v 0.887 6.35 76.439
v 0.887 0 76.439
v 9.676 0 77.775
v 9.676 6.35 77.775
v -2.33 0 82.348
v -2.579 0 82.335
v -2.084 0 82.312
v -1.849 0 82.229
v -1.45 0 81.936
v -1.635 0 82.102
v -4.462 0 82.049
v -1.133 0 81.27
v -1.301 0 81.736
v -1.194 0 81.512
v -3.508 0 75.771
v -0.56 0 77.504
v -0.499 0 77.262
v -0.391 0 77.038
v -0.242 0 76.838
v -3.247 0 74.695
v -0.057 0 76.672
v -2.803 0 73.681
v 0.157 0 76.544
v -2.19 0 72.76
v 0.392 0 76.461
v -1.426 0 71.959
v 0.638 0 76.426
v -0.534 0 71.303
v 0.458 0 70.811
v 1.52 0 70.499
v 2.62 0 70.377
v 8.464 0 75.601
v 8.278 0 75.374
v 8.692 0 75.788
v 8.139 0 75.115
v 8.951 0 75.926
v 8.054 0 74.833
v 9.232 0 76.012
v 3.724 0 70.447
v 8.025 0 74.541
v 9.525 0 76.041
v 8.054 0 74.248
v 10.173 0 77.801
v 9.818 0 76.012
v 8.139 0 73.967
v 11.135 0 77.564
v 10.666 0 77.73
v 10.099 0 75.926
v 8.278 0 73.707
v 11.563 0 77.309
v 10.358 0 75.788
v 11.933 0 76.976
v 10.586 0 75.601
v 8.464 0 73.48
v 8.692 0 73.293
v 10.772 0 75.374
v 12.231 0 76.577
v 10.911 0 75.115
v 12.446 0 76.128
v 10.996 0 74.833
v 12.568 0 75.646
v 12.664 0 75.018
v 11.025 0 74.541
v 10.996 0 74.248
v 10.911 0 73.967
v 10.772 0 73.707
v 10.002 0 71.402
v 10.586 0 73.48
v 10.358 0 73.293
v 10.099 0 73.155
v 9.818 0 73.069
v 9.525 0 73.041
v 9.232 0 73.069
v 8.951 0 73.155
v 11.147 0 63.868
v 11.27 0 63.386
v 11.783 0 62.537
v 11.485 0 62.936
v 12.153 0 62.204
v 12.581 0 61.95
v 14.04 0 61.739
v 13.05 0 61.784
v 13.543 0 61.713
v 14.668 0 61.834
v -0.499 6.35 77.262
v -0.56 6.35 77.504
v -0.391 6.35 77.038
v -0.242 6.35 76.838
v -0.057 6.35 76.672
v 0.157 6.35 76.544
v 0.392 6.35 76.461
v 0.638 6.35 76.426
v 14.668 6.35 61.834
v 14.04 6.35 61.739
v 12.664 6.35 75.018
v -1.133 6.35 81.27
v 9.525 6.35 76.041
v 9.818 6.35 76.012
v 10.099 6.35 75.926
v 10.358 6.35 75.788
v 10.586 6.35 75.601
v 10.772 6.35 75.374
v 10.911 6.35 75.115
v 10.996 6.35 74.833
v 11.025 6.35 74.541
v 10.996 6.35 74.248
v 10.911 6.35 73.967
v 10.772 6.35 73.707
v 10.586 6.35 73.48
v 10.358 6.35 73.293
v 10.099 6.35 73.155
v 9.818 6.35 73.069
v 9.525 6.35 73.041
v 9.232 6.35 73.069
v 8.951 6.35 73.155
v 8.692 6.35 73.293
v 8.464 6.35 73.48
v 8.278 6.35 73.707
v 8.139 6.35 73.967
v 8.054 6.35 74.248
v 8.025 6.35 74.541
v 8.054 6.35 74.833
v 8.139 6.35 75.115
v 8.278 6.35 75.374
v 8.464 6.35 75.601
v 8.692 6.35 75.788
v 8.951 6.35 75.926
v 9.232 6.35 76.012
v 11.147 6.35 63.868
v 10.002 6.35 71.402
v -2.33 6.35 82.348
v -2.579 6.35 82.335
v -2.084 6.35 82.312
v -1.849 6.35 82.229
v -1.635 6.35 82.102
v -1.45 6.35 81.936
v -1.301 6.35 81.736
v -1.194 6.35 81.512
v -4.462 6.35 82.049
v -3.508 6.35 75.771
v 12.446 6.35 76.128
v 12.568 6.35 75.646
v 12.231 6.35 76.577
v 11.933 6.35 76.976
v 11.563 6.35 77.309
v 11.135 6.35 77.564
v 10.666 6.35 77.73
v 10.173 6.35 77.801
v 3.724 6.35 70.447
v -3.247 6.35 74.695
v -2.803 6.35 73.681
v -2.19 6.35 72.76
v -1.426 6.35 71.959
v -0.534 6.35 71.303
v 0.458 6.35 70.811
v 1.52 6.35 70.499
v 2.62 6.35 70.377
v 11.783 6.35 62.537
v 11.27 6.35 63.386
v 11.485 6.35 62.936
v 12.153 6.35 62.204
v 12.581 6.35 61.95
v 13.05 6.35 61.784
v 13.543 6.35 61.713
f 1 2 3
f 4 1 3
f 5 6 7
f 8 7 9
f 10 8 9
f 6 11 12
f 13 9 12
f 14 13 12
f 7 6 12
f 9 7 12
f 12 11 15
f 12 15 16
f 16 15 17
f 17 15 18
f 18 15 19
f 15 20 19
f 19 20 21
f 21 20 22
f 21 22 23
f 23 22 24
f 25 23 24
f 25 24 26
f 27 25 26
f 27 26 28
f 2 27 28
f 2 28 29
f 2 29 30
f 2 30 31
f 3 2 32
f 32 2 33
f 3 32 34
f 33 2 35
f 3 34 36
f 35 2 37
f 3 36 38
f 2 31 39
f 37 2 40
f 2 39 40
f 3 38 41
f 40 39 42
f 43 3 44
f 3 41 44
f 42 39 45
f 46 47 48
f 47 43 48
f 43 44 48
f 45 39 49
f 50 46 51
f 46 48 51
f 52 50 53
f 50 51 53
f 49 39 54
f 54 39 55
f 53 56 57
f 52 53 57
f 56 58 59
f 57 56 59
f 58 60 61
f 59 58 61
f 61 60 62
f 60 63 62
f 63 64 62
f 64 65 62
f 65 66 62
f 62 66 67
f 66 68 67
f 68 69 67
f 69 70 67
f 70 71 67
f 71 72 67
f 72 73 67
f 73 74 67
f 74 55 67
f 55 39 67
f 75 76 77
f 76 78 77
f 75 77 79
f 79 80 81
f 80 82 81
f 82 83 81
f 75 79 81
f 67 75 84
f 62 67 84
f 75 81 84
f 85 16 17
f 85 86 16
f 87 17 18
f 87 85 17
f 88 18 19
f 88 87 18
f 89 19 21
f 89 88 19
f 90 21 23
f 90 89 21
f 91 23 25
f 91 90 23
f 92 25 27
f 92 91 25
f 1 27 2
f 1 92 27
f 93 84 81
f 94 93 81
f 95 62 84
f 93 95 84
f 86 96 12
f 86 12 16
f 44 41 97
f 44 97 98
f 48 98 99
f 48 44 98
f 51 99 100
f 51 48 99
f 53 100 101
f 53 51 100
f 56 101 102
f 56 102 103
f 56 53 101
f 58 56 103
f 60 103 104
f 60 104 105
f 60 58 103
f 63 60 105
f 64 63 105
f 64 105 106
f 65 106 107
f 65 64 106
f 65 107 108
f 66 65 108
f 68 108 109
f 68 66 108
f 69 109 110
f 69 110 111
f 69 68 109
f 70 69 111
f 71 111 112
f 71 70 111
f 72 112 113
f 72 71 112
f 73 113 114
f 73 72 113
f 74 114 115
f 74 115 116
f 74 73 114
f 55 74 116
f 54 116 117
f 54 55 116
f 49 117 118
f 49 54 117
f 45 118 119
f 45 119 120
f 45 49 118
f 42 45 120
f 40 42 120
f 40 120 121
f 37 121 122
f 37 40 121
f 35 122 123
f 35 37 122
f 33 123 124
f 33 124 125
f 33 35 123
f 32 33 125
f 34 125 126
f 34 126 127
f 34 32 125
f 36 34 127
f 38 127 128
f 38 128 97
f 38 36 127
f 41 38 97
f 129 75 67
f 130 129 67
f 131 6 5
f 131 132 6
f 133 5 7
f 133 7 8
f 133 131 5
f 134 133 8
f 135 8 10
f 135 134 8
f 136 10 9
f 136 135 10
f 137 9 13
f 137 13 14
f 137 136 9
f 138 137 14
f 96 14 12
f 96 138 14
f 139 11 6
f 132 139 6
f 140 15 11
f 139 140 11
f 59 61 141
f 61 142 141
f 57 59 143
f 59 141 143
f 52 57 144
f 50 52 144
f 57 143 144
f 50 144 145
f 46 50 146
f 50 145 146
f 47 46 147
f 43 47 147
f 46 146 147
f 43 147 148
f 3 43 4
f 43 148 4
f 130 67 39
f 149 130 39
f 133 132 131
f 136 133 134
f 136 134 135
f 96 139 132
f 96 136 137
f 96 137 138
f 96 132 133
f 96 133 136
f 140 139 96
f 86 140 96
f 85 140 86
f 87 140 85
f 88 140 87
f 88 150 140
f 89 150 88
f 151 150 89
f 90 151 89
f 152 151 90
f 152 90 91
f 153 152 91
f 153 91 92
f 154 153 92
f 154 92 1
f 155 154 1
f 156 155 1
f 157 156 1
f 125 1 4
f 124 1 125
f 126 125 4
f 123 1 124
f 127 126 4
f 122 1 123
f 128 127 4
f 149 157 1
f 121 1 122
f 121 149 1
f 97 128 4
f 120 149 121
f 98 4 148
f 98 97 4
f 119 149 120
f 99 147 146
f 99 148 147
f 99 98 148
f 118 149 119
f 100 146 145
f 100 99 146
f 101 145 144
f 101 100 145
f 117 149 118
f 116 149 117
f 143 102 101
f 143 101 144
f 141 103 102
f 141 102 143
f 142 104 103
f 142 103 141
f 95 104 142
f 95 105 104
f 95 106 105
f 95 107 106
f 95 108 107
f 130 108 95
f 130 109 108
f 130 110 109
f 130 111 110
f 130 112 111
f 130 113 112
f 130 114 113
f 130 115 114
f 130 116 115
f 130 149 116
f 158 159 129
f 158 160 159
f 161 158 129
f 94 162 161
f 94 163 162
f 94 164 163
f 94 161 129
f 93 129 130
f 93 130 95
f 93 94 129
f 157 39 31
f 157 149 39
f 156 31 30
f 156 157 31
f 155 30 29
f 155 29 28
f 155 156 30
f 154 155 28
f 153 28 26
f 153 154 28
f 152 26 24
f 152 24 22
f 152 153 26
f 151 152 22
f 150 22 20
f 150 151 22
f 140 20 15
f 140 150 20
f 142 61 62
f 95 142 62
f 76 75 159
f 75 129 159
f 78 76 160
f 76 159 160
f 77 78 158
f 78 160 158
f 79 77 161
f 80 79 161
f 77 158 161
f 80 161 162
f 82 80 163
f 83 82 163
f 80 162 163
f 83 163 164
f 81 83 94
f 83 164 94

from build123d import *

# Parameters (mm, degrees)
SKETCH2_R           = 1.5
BOSS_EXTRUDE1_DEPTH = 6.35
FILLET1_R           = 1.27
FILLET2_R           = 2.54
FILLET3_R           = 6.35
FILLET4_R           = 2.54


with BuildPart() as part:
    # Sketch2 → Boss-Extrude1 (new body)
    with BuildSketch(Plane(origin=(0, 0, 0), x_dir=(1, 0, 0), z_dir=(0, 1, 0))):
        Polygon((-2.553535433, -69.492861925), (-4.46233448, -82.048597116), (-1.323400683, -82.525796878), (-0.369001159, -76.247929282), (12.186734033, -78.15672833), (12.663933794, -75.017794532), (14.668172794, -61.834272581), (11.529238997, -61.357072819), (10.002199758, -71.401660972), align=None)
        with Locations(Location((9.524999997, -74.54059477, 0), (0, 0, 270))):
            Circle(SKETCH2_R, mode=Mode.SUBTRACT)
    extrude(amount=BOSS_EXTRUDE1_DEPTH)

    # Fillet1
    fillet1_edges = [part.edges().sort_by_distance(p)[0] for p in [
        (-0.369001159, 3.175, 76.247929282),
        (-1.323400683, 3.175, 82.525796878),
    ]]
    fillet(fillet1_edges, radius=FILLET1_R)

    # Fillet2
    fillet2_edges = [part.edges().sort_by_distance(p)[0] for p in [
        (11.529238997, 3.175, 61.357072819),
    ]]
    fillet(fillet2_edges, radius=FILLET2_R)

    # Fillet3
    fillet3_edges = [part.edges().sort_by_distance(p)[0] for p in [
        (-2.553535433, 3.175, 69.492861925),
    ]]
    fillet(fillet3_edges, radius=FILLET3_R)

    # Fillet4
    fillet4_edges = [part.edges().sort_by_distance(p)[0] for p in [
        (12.186734033, 3.175, 78.15672833),
    ]]
    fillet(fillet4_edges, radius=FILLET4_R)


solid = part.part
